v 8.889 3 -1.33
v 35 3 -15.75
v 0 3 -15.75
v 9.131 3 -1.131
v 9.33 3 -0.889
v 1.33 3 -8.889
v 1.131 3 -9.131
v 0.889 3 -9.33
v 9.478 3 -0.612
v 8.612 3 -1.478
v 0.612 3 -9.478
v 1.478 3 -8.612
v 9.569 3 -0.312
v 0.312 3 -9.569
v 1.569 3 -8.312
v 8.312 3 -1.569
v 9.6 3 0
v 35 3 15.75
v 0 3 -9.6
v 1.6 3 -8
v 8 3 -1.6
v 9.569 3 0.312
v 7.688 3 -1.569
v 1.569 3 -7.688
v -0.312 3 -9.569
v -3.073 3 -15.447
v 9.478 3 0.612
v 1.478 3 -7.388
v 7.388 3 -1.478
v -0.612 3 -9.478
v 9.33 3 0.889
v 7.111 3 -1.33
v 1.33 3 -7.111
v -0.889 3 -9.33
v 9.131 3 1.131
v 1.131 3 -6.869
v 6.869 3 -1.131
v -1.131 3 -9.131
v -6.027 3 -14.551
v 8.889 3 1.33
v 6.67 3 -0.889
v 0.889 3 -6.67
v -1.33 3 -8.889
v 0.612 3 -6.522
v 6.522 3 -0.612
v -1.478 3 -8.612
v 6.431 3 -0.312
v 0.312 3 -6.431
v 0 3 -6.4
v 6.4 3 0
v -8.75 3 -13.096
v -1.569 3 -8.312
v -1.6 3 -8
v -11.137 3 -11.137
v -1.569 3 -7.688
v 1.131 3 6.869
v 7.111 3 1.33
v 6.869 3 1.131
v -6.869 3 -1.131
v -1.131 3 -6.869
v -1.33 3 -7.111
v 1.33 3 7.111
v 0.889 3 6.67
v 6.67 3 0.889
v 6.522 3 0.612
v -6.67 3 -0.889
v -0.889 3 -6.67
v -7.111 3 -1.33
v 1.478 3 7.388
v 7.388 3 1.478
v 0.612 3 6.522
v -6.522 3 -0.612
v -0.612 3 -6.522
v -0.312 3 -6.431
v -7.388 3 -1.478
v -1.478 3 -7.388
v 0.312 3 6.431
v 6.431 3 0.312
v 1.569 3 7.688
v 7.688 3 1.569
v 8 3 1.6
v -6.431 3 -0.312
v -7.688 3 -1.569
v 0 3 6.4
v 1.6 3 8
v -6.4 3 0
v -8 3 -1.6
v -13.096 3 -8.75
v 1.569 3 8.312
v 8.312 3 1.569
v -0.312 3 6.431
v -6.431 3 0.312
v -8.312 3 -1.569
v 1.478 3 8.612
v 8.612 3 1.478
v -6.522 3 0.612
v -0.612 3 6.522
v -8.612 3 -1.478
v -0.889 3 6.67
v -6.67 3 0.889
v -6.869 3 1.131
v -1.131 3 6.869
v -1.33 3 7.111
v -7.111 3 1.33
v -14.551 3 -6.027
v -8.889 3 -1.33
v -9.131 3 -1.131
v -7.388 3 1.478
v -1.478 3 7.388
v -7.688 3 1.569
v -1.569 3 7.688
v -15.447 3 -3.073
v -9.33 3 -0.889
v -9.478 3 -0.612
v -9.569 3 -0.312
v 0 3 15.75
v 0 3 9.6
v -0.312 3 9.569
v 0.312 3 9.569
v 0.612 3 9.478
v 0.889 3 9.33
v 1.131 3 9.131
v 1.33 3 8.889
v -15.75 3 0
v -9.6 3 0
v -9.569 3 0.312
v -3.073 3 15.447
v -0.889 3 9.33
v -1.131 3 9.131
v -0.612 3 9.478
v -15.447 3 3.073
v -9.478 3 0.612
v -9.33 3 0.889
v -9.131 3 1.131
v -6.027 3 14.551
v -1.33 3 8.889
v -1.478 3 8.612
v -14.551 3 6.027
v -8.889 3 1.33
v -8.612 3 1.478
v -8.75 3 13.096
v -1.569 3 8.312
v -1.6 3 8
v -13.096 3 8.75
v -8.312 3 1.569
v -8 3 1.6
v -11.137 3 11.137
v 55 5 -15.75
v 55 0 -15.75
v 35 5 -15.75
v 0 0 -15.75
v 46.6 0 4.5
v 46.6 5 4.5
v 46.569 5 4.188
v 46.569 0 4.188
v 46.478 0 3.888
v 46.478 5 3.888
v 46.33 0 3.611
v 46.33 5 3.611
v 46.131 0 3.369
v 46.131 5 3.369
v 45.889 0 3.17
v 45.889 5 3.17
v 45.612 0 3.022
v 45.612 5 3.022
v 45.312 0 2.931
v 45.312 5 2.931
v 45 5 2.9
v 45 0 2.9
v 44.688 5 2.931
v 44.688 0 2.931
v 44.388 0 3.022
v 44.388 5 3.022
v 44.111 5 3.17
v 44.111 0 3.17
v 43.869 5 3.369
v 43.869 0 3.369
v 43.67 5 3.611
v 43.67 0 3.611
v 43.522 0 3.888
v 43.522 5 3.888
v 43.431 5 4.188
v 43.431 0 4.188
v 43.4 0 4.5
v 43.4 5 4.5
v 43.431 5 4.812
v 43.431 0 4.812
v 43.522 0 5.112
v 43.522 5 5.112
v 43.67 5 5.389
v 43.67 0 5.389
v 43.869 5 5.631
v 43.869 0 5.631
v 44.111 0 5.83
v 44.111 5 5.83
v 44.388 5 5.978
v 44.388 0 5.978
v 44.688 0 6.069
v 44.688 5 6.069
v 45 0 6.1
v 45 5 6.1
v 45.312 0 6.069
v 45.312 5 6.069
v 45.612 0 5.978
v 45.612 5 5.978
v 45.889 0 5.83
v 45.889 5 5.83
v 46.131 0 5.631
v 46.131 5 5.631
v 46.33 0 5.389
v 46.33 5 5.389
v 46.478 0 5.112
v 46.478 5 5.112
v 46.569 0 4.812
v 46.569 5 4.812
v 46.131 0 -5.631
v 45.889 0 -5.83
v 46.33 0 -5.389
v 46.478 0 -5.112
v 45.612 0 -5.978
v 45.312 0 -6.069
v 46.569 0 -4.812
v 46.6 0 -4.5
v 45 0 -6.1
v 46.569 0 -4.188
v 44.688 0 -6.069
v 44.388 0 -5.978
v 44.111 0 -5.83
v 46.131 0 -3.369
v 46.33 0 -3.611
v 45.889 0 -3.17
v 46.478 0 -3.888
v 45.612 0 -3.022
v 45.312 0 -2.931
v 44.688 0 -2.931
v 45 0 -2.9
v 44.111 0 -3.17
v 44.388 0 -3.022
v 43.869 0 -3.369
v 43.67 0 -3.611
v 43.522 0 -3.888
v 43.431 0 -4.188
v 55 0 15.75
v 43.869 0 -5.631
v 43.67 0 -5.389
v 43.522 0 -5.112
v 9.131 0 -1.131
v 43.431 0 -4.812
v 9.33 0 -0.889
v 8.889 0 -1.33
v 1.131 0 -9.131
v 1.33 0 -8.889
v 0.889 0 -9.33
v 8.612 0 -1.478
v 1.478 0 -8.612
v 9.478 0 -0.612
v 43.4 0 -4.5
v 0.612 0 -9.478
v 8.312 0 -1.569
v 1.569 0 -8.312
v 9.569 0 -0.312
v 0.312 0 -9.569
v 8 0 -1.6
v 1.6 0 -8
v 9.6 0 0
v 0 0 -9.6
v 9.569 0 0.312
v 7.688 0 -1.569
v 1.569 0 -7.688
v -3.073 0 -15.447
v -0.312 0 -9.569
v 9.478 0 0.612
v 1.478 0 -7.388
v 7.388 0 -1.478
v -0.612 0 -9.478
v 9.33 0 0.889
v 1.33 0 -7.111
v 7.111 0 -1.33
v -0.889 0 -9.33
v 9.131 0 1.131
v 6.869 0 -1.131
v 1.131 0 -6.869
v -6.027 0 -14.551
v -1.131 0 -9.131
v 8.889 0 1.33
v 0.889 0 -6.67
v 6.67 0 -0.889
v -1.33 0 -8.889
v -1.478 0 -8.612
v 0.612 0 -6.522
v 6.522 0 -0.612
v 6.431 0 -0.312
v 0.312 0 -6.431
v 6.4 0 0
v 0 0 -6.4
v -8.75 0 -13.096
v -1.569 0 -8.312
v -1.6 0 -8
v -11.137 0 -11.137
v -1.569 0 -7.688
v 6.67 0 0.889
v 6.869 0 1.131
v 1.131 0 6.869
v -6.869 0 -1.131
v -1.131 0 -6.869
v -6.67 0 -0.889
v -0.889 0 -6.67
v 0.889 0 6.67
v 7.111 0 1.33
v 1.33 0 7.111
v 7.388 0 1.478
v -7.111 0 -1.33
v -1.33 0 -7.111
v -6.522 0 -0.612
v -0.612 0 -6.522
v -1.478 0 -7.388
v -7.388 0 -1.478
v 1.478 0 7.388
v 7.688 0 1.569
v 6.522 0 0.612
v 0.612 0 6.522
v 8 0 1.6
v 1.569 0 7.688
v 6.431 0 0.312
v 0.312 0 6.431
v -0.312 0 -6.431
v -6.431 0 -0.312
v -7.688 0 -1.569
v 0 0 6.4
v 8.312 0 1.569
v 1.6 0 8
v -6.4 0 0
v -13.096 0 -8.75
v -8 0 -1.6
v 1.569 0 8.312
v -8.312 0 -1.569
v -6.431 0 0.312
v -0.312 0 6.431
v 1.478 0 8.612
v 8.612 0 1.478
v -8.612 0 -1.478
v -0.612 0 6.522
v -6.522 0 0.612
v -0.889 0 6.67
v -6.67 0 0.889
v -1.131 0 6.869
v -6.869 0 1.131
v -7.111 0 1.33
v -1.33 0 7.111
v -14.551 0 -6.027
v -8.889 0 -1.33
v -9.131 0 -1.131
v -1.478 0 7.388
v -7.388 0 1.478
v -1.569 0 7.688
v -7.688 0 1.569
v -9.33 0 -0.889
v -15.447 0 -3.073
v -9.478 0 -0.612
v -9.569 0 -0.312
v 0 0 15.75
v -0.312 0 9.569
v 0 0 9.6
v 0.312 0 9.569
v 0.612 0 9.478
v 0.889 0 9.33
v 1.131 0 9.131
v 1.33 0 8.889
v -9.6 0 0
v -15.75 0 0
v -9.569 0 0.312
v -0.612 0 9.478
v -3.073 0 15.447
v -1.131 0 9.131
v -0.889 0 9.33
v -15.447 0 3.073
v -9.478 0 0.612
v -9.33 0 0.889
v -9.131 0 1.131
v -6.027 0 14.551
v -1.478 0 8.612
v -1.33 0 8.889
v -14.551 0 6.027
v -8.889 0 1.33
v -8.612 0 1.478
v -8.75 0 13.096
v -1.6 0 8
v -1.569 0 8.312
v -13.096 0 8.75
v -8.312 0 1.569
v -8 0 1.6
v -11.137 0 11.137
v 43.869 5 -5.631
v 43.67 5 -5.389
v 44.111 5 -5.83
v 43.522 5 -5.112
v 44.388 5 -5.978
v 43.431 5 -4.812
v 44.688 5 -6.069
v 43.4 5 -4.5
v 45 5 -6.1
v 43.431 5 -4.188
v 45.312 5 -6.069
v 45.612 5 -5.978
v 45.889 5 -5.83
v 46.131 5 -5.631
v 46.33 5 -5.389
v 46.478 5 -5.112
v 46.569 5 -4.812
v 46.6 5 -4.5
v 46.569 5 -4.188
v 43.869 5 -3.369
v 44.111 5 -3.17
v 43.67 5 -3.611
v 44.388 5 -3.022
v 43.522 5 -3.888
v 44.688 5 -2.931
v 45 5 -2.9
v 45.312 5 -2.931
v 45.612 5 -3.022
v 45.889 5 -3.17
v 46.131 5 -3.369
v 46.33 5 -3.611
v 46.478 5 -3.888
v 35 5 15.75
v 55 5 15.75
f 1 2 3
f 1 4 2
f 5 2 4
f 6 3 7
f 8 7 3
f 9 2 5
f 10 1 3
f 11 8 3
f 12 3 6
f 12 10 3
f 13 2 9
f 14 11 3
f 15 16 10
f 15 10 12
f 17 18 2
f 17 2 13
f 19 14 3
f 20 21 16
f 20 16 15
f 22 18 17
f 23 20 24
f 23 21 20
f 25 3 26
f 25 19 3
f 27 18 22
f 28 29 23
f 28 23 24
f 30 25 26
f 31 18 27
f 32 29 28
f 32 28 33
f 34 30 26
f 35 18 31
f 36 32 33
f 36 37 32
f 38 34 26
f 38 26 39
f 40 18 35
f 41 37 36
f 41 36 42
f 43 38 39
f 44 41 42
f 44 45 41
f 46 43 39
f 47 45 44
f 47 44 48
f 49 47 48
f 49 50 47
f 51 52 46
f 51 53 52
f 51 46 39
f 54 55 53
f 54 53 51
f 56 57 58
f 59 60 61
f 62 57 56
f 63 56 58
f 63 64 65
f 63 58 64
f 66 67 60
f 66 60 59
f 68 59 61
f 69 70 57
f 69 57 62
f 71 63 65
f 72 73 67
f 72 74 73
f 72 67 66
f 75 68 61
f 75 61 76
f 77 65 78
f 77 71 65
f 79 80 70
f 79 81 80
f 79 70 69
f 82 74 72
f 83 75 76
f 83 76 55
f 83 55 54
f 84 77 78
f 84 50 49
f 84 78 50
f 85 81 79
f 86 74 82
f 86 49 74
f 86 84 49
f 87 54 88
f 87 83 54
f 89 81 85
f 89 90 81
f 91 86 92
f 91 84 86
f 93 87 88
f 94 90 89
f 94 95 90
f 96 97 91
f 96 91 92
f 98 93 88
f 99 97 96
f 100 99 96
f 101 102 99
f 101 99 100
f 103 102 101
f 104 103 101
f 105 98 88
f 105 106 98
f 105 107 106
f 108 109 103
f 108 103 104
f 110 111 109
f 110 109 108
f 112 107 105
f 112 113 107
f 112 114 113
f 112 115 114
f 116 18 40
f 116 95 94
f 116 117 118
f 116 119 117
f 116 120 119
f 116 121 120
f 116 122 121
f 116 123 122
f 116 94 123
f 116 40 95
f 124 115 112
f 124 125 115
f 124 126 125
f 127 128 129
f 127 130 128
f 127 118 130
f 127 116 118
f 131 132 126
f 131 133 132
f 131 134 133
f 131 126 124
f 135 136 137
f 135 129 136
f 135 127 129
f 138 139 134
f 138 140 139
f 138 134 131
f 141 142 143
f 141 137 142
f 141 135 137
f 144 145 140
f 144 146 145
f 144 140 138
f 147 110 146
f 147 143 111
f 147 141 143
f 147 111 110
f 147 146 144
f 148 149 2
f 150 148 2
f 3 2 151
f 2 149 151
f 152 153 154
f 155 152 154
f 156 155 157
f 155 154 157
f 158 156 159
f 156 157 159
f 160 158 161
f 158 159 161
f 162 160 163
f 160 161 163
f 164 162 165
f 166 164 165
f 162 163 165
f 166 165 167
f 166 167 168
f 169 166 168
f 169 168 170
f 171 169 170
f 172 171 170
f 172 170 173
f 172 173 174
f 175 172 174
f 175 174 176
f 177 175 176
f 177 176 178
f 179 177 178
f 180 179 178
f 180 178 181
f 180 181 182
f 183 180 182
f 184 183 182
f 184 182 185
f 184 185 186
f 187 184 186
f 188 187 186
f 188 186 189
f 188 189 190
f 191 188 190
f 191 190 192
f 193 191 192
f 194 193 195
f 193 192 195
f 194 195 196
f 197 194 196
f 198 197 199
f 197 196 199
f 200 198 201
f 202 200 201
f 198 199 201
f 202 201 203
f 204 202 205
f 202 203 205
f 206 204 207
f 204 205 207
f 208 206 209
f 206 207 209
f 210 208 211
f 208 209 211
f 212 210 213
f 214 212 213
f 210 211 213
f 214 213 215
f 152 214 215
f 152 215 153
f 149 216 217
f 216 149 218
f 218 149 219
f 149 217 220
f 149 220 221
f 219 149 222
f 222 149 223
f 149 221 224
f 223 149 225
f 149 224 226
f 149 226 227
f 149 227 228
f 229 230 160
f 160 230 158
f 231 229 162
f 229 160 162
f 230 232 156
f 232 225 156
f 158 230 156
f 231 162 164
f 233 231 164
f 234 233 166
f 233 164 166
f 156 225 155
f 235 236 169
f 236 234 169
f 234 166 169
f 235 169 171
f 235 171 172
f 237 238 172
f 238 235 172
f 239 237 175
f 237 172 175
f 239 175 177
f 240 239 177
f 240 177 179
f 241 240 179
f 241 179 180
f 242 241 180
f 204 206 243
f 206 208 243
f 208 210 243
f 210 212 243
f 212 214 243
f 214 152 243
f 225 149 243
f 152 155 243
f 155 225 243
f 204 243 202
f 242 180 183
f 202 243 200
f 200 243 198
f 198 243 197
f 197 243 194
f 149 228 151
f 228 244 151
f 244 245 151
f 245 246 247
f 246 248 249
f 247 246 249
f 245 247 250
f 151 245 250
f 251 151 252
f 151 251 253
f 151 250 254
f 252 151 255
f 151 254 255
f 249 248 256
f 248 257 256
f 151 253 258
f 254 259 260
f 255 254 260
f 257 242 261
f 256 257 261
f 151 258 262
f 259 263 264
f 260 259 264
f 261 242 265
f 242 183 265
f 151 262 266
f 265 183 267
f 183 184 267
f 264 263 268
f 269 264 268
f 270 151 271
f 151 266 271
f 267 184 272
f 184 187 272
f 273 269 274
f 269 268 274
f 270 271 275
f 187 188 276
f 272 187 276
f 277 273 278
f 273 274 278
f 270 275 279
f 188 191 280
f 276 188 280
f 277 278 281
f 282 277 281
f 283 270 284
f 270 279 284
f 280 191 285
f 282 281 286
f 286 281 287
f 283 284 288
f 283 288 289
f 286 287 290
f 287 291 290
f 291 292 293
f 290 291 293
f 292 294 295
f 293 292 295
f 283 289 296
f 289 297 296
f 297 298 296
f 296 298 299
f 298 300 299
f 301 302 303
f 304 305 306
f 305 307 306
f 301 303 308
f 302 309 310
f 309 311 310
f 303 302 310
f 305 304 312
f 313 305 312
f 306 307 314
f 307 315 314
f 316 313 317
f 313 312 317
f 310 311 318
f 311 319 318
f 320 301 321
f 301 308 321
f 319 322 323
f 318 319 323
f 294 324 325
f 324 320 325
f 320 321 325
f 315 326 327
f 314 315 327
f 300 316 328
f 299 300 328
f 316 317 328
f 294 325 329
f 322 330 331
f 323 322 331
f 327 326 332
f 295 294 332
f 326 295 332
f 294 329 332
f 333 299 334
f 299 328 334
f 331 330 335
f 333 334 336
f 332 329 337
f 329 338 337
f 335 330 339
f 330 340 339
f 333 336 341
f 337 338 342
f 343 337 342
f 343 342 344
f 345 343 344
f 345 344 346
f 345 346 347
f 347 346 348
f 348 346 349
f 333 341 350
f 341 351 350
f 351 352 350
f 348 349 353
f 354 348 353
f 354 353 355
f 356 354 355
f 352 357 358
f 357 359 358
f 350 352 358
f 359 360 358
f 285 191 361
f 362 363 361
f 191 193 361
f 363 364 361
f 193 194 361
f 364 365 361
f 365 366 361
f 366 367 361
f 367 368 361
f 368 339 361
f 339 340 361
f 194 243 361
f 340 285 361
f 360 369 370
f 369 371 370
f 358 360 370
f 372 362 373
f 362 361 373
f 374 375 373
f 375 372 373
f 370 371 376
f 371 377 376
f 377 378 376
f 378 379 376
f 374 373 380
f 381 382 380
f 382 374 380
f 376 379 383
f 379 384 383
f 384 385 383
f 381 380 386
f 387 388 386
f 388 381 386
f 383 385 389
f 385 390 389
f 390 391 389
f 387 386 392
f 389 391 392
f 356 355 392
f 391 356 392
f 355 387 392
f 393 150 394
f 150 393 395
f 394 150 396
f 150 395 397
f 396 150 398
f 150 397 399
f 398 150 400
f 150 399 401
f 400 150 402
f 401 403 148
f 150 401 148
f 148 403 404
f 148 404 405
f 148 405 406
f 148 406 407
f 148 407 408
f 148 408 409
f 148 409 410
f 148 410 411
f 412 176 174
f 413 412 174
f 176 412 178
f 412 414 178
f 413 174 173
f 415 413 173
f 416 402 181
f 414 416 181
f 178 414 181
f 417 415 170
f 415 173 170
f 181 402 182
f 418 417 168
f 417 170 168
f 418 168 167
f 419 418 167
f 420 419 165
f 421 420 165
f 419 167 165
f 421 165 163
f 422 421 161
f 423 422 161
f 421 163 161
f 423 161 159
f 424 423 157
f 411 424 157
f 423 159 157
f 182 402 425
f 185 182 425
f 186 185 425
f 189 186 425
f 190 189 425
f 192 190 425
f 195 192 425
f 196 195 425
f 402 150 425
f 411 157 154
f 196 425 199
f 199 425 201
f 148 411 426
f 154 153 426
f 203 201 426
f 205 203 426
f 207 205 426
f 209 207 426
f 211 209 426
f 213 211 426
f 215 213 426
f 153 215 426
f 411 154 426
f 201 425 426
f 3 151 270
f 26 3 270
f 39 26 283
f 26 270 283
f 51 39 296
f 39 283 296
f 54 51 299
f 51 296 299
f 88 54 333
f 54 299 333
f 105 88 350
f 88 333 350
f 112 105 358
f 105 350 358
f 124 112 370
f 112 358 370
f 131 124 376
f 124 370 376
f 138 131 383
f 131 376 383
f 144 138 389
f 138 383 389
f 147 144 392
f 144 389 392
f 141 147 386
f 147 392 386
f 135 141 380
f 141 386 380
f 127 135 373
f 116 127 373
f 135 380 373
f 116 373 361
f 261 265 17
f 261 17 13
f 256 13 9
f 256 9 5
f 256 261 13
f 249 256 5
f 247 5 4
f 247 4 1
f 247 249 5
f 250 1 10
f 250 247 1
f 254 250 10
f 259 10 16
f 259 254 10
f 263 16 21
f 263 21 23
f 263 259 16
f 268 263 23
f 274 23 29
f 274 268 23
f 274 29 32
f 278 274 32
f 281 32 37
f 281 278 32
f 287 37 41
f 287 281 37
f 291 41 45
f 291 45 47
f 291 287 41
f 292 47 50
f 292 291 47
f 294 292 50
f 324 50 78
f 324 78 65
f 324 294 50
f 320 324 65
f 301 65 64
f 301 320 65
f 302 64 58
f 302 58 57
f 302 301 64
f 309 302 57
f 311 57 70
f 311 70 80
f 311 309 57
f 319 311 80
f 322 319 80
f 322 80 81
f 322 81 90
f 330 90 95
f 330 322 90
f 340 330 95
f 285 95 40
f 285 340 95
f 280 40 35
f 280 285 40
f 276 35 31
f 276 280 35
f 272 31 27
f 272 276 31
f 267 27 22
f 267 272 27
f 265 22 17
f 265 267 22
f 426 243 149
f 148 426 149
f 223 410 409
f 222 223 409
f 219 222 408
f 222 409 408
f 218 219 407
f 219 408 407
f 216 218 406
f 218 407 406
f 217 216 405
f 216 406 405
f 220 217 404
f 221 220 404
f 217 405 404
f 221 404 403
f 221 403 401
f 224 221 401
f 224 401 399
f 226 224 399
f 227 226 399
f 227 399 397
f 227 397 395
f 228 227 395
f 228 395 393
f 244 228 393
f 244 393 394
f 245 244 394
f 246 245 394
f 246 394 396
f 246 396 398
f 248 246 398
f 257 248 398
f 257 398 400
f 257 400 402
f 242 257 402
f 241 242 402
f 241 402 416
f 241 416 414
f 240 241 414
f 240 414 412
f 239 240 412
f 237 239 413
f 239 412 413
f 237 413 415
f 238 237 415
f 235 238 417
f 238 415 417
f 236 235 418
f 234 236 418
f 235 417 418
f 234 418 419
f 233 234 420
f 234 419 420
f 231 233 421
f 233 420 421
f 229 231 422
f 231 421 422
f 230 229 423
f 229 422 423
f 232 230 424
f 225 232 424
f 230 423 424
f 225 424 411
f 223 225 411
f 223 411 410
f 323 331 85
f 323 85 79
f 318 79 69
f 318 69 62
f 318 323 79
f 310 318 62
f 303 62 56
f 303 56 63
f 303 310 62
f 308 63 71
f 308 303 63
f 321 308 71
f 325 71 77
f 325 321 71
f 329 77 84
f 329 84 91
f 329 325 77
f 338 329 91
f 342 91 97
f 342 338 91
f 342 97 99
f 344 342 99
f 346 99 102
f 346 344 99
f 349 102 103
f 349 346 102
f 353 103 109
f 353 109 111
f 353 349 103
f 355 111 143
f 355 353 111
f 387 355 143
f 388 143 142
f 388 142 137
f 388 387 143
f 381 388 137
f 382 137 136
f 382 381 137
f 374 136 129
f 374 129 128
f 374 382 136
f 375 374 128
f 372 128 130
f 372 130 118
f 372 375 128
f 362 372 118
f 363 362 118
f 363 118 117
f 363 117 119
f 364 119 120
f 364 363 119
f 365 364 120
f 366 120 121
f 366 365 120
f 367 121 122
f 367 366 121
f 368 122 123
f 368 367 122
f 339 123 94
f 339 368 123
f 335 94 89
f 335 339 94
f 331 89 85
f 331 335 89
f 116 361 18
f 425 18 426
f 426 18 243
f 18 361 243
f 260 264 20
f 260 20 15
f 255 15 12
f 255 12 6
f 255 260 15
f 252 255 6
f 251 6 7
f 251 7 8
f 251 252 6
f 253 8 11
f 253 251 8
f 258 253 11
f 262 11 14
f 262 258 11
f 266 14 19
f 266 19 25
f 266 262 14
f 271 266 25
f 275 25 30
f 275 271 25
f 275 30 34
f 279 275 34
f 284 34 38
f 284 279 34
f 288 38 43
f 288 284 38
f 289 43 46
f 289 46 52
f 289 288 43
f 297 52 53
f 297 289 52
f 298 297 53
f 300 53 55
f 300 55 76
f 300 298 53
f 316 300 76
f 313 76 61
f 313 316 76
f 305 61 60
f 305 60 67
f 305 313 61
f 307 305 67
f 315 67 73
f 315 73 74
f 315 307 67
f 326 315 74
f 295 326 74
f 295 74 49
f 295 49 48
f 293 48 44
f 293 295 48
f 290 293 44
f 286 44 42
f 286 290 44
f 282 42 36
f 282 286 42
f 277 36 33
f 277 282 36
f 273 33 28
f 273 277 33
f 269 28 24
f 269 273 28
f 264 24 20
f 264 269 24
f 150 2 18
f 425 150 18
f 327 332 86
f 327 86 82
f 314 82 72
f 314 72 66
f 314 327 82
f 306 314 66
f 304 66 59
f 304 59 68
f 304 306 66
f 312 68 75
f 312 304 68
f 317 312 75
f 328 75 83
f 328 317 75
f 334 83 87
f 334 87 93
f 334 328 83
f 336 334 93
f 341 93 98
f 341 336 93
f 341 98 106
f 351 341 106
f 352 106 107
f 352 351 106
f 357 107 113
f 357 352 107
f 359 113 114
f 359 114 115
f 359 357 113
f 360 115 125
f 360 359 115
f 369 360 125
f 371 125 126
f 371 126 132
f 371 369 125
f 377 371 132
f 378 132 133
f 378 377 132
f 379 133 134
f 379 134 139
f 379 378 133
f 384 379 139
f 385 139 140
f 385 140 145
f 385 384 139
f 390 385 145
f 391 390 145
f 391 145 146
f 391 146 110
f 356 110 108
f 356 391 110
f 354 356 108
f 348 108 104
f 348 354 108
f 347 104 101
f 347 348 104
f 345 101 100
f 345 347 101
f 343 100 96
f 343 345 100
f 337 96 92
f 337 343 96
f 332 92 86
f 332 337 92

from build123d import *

# Parameters (mm, degrees)
SKETCH_1_R          = 15.75
SKETCH_1_R_2        = 1.6
EXTRUDE_1_DEPTH     = 3
EXTRUDE_2_DEPTH     = 3
SKETCH_3_W          = 20
SKETCH_3_H          = 31.5
EXTRUDE_3_DEPTH     = 5
SKETCH_4_R          = 1.6
CUT_EXTRUDE_1_DEPTH = 10


with BuildPart() as part:
    # 草图1 → 凸台-拉伸1 (new body)
    with BuildSketch(Plane(origin=(0, 0, 0), x_dir=(1, 0, 0), z_dir=(0, 1, 0))):
        Circle(SKETCH_1_R)
        with Locations((0, 8)):
            Circle(SKETCH_1_R_2, mode=Mode.SUBTRACT)
        with Locations((8, 0)):
            Circle(SKETCH_1_R_2, mode=Mode.SUBTRACT)
        with Locations((0, -8)):
            Circle(SKETCH_1_R_2, mode=Mode.SUBTRACT)
        with Locations((-8, 0)):
            Circle(SKETCH_1_R_2, mode=Mode.SUBTRACT)
    extrude(amount=EXTRUDE_1_DEPTH)

    # 草图2 → 凸台-拉伸2 (add)
    with BuildSketch(Plane.XZ):
        with BuildLine():
            Line((0, 15.75), (55, 15.75))
            Line((55, 15.75), (55, -15.75))
            Line((55, -15.75), (0, -15.75))
            ThreePointArc((0, -15.75), (15.75, 0), (0, 15.75))
        make_face()
    extrude(amount=-EXTRUDE_2_DEPTH)

    # 草图3 → 凸台-拉伸3 (add)
    with BuildSketch(Plane.XZ):
        with Locations((45, 0)):
            Rectangle(SKETCH_3_W, SKETCH_3_H)
    extrude(amount=-EXTRUDE_3_DEPTH)

    # 草图4 → 切除-拉伸1 (cut)
    with BuildSketch(Plane(origin=(0, 5, 0), x_dir=(1, 0, 0), z_dir=(0, 1, 0))):
        with Locations((45, 4.5)):
            Circle(SKETCH_4_R)
        with Locations((45, -4.5)):
            Circle(SKETCH_4_R)
    extrude(amount=-CUT_EXTRUDE_1_DEPTH, mode=Mode.SUBTRACT)


solid = part.part
